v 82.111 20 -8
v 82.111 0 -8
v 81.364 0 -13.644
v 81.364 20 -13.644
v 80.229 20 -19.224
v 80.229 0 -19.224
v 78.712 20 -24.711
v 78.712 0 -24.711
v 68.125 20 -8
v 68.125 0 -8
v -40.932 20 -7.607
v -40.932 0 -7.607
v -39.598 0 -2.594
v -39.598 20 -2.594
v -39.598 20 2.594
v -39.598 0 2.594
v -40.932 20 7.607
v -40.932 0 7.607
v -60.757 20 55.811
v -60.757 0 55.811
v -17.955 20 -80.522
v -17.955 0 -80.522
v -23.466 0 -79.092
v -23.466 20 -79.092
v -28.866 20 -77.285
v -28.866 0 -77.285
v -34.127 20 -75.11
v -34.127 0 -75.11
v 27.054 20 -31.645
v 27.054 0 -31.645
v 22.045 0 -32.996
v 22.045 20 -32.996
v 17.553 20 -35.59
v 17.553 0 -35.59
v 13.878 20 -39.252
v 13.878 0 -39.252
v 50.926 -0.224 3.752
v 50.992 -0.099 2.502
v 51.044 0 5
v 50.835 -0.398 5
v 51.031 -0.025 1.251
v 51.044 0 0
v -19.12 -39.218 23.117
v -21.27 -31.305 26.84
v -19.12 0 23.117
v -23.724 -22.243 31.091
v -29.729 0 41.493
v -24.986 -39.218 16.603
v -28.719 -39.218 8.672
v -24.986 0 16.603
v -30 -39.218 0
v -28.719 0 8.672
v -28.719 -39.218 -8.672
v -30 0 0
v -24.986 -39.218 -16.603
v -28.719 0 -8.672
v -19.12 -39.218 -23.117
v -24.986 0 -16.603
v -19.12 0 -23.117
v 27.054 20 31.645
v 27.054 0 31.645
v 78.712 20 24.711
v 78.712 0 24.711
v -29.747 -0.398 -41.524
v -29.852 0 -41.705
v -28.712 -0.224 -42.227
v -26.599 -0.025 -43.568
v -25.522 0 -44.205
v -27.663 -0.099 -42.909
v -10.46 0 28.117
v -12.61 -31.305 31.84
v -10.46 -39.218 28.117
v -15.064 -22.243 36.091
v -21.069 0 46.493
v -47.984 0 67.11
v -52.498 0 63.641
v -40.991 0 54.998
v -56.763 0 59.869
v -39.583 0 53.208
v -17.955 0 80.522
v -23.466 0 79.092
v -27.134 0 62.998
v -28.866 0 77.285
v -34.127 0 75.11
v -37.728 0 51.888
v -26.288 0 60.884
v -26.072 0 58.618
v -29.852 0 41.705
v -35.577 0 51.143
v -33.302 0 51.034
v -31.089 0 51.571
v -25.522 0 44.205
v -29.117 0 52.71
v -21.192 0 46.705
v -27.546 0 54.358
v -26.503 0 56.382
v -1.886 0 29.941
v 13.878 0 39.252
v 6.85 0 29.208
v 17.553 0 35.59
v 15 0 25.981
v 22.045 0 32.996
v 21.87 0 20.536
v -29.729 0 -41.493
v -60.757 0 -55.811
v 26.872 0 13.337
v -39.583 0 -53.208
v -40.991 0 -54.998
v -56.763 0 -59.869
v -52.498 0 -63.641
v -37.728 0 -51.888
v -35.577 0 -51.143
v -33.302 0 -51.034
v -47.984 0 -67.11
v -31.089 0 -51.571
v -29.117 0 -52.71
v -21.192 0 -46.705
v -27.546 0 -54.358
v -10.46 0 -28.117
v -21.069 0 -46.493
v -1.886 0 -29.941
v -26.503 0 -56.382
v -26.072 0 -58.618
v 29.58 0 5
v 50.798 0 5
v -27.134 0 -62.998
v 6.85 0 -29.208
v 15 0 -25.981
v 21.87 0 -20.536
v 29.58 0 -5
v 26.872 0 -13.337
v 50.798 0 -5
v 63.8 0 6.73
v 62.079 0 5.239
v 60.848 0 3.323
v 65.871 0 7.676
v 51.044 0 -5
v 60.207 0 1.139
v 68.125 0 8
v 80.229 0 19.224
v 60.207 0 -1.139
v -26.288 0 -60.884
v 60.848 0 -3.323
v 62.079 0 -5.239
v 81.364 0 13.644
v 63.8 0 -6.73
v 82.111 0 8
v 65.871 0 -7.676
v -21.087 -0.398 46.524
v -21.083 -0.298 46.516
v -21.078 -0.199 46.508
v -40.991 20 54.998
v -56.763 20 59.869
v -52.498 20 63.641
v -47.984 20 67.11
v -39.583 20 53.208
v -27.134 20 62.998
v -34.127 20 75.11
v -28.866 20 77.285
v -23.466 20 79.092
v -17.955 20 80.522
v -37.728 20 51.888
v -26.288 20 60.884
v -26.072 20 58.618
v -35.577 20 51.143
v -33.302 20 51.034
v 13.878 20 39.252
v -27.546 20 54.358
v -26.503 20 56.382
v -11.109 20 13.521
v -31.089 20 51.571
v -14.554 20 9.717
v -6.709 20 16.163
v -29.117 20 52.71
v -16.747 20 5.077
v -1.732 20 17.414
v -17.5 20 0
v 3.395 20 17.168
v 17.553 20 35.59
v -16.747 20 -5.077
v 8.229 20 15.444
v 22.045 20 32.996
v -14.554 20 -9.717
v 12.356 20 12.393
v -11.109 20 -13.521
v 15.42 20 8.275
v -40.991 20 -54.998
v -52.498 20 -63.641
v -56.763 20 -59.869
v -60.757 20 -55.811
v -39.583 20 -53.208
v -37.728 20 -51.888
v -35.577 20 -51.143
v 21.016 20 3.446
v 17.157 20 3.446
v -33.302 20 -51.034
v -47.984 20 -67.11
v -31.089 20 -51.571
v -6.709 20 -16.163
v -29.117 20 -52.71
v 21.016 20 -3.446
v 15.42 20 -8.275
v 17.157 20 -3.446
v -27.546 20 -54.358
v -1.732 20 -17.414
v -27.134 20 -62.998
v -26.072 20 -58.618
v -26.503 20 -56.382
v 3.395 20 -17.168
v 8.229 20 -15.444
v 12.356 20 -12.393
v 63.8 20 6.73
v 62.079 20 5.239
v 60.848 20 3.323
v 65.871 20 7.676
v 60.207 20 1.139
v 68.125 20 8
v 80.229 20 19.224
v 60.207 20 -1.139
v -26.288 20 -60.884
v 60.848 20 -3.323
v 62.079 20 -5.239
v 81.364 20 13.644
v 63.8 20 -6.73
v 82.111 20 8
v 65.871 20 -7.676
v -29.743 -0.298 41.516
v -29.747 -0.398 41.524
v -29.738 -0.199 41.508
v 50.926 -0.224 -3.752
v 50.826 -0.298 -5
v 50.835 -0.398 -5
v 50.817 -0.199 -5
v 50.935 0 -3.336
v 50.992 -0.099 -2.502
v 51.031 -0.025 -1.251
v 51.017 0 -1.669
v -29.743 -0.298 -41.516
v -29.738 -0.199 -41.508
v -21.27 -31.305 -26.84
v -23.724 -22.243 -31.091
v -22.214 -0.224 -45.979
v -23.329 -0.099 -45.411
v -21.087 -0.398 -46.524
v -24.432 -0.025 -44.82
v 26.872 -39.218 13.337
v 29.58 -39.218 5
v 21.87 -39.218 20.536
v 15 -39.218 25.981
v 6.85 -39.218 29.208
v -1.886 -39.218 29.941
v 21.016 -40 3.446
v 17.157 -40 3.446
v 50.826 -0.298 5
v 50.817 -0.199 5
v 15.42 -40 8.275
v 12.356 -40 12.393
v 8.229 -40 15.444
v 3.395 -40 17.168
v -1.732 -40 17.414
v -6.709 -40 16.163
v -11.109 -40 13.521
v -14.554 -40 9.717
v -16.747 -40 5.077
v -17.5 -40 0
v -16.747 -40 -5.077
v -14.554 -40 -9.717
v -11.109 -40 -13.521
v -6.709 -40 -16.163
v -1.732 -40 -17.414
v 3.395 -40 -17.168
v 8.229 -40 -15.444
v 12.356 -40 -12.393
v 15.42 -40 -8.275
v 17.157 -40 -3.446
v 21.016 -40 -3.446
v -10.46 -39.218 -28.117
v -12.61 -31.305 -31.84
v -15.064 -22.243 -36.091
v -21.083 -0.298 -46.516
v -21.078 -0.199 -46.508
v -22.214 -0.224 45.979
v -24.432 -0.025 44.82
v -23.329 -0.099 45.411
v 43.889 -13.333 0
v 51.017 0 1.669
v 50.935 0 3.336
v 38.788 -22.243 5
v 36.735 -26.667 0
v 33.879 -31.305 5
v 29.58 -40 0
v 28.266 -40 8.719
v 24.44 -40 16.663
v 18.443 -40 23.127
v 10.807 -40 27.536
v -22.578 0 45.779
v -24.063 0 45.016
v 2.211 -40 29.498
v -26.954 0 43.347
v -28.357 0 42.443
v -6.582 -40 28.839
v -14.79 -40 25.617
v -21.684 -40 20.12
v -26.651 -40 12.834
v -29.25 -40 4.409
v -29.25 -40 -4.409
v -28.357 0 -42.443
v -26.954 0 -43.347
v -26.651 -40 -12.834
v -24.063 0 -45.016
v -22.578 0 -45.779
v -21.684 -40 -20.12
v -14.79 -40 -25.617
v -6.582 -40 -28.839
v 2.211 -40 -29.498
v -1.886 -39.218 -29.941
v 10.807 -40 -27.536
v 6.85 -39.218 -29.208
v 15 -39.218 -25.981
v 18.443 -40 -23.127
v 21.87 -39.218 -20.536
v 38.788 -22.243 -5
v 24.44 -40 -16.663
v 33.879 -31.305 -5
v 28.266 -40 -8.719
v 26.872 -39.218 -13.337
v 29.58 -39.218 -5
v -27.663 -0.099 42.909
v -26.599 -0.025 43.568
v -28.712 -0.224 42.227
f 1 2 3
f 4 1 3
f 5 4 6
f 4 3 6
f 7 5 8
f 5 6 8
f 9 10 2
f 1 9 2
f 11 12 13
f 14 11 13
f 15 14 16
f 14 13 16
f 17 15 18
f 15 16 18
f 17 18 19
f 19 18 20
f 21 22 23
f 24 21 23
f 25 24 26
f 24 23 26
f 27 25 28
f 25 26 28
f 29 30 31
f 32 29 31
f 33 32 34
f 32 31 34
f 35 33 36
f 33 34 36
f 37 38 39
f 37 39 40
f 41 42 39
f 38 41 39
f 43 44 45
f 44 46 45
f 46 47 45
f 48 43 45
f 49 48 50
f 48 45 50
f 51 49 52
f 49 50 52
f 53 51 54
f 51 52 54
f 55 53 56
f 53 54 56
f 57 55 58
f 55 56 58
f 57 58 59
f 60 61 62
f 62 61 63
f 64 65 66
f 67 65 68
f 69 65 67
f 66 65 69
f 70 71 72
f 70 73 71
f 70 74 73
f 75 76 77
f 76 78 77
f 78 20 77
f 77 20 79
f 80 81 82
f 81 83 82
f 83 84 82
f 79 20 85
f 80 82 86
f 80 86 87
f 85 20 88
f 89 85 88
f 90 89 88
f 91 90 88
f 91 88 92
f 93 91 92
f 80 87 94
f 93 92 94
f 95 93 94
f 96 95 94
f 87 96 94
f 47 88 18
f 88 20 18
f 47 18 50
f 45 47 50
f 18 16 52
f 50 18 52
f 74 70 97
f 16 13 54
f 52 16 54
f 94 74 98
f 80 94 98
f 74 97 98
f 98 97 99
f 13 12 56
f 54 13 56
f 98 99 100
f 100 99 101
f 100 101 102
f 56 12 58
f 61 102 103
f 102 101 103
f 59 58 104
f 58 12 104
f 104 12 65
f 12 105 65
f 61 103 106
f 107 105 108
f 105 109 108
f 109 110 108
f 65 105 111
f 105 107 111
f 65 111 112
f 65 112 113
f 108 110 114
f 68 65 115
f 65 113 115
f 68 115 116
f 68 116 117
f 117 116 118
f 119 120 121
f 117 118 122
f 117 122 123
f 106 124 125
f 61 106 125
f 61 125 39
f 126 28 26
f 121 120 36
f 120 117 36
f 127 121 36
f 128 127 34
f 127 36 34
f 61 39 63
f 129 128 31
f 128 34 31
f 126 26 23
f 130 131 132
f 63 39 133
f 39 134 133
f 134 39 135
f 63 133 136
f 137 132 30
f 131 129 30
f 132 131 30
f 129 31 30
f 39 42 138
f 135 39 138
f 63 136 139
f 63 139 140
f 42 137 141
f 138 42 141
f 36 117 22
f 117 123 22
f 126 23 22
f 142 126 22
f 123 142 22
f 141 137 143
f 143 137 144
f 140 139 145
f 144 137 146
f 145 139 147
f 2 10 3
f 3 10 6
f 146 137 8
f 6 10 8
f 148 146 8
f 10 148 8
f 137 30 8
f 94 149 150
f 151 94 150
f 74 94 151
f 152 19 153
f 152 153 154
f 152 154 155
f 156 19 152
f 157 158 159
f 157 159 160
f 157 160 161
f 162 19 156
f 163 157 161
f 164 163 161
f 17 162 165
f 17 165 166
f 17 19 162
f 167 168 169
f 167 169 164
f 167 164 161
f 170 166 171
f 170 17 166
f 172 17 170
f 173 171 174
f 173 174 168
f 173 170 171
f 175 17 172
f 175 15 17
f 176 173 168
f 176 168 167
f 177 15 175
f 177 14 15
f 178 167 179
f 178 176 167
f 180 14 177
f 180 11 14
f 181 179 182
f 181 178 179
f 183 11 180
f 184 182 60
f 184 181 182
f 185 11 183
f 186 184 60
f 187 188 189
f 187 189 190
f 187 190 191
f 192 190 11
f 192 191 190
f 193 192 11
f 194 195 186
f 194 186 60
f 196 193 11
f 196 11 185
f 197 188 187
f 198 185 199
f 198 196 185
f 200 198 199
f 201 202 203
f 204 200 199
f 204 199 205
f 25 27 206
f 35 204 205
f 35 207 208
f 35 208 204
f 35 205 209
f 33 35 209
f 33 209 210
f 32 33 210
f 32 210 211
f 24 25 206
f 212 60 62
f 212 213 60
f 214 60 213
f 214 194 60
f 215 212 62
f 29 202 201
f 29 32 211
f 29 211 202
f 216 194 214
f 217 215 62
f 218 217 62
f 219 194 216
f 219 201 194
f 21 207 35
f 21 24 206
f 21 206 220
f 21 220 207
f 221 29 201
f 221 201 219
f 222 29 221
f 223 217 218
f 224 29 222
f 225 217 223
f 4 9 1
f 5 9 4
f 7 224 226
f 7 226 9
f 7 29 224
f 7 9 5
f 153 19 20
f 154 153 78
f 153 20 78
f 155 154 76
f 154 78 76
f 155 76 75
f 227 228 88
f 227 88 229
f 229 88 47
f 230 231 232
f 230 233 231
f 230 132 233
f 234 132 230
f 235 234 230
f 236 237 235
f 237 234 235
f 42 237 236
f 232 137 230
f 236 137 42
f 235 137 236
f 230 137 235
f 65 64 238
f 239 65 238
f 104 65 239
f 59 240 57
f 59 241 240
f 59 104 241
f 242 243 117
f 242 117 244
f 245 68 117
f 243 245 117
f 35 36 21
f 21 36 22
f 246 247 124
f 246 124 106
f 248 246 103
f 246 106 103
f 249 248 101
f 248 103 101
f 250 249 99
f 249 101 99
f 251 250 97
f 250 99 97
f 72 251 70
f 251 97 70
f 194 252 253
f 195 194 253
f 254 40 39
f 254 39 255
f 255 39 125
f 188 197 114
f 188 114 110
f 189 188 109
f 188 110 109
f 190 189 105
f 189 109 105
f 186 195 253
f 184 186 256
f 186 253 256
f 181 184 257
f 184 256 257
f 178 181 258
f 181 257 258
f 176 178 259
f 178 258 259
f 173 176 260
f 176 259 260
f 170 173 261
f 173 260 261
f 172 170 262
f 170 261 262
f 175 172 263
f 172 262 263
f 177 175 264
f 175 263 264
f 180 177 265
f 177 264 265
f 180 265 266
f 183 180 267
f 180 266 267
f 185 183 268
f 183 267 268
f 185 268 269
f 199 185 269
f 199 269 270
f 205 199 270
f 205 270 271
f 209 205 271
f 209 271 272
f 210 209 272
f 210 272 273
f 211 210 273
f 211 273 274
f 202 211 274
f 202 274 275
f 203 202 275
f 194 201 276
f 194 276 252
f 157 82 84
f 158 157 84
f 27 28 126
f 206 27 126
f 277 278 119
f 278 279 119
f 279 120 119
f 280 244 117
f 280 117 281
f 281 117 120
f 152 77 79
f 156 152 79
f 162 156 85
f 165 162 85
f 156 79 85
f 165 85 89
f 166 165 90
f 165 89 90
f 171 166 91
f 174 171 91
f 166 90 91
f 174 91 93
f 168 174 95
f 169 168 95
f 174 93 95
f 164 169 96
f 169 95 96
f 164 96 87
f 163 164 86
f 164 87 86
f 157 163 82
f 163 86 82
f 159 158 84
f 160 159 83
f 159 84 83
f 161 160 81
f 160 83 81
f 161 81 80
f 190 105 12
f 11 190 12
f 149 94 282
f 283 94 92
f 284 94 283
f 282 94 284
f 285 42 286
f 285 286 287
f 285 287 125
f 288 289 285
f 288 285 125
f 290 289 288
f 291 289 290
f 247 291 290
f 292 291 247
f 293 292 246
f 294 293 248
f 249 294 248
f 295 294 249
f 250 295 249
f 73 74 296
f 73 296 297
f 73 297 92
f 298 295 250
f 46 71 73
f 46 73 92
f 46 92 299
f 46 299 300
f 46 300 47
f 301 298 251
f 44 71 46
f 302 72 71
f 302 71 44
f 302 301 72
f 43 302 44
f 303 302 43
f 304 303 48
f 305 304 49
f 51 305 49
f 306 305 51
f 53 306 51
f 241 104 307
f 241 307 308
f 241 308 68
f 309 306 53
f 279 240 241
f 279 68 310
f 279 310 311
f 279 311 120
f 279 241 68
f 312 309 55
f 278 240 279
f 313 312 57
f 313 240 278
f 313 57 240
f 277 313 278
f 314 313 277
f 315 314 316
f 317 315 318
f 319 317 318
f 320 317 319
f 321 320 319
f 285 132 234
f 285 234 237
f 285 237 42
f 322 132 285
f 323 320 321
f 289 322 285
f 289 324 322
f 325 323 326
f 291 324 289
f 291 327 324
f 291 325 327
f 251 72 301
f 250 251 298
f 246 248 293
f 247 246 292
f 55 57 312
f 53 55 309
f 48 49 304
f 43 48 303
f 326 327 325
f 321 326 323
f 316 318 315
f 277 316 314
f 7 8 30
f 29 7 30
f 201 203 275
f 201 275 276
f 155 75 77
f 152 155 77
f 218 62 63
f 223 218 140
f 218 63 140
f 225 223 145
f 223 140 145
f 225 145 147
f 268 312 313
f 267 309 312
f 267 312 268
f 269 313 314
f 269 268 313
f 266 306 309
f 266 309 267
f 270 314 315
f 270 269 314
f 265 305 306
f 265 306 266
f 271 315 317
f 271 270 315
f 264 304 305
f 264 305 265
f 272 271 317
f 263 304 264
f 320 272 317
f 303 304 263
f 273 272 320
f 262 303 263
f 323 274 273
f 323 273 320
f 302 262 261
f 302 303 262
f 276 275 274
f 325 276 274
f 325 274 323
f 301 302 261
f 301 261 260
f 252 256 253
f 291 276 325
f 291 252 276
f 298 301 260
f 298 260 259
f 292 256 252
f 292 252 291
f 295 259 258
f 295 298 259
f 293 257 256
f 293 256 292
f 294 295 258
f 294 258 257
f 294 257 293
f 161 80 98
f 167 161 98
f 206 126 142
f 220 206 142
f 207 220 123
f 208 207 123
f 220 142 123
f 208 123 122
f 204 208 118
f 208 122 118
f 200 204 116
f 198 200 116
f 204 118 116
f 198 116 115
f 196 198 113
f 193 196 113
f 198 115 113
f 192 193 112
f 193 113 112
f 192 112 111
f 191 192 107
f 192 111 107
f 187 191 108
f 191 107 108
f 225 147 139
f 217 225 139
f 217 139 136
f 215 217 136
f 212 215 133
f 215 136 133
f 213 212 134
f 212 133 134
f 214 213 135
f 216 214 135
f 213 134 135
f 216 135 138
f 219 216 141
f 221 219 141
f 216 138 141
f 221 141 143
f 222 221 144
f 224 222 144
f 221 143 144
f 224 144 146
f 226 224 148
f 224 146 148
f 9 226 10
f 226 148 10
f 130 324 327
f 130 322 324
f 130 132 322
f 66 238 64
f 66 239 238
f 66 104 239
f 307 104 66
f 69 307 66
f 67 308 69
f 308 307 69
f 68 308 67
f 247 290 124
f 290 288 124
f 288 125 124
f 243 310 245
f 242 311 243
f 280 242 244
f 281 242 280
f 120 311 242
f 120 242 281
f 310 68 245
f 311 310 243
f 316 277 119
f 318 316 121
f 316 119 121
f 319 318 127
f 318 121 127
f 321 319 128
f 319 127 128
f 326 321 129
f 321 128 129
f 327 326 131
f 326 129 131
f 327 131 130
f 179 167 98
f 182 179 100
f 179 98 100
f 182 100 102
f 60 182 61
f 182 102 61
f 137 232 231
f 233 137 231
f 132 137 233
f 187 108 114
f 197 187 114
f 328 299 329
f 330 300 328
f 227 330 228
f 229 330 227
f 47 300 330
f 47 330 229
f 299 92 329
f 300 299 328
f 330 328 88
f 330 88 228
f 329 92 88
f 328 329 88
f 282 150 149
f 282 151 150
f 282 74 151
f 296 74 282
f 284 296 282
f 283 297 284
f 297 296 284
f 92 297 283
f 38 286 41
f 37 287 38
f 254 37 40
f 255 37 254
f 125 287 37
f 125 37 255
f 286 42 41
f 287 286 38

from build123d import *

# Parameters (mm, degrees)
SKETCH1_R                = 82.5
BOSS_EXTRUDE1_DEPTH      = 20
SKETCH2_R                = 30
BOSS_EXTRUDE2_DEPTH      = 40
SKETCH3_R                = 17.5
CUT_EXTRUDE1_DEPTH       = 61
BOSS_EXTRUDE3_DEPTH      = 5
CIRPATTERN4_COUNT        = 3
CUT_EXTRUDE13_DEPTH      = 21
CIRPATTERN5_COUNT        = 3
CUT_EXTRUDE14_DEPTH      = 21
CIRPATTERN6_COUNT        = 3
CUT_EXTRUDE15_DEPTH      = 21
CUT_EXTRUDE15_DEPTH_BACK = 41


with BuildPart() as part:
    # Sketch1 → Boss-Extrude1 (new body)
    with BuildSketch(Plane(origin=(0, 0, 0), x_dir=(1, 0, 0), z_dir=(0, 1, 0))):
        Circle(SKETCH1_R)
    extrude(amount=BOSS_EXTRUDE1_DEPTH)

    # Sketch2 → Boss-Extrude2 (add)
    with BuildSketch(Plane.XZ):
        Circle(SKETCH2_R)
    extrude(amount=BOSS_EXTRUDE2_DEPTH)

    # Sketch3 → Cut-Extrude1 (cut, through all)
    with BuildSketch(Plane.XZ.offset(40)):
        Circle(SKETCH3_R)
    extrude(amount=-CUT_EXTRUDE1_DEPTH, mode=Mode.SUBTRACT)

    # Sketch4 → Boss-Extrude3 (add, symmetric)
    with BuildSketch(Plane.XY):
        Polygon((26.043936365, 0), (51.043936365, 0), (30, -40), (26.043936365, -40), align=None)
    boss_extrude3 = extrude(amount=BOSS_EXTRUDE3_DEPTH, both=True)

    # CirPattern4: Boss-Extrude3 ×3 about axis
    cirpattern4_axis = Axis((0, 0, 0), (0, 1, 0))
    for i in range(1, CIRPATTERN4_COUNT):
        add(boss_extrude3.rotate(cirpattern4_axis, i * 360 / CIRPATTERN4_COUNT))

    # Sketch5 → Cut-Revolve1 (revolve, cut)
    with BuildSketch(Plane.XY):
        Polygon((51.043936365, 0), (29.580398915, -40), (54.67204938, -40), align=None)
    revolve(axis=Axis((0, 0, 0), (0, -1, 0)), mode=Mode.SUBTRACT)

    # Sketch10 → Cut-Extrude13 (cut, through all)
    with BuildSketch(Plane(origin=(0, 0, 0), x_dir=(1, 0, 0), z_dir=(0, 1, 0))):
        with BuildLine():
            ThreePointArc((-60.756737715, -55.811009866), (-82.5, 0), (-60.756737715, 55.811009866))
            Line((-60.756737715, 55.811009866), (-40.932429831, 7.606987591))
            ThreePointArc((-40.932429831, 7.606987591), (-39.429287397, 0), (-40.932429831, -7.606987591))
            Line((-40.932429831, -7.606987591), (-60.756737715, -55.811009866))
        make_face()
    cut_extrude13 = extrude(amount=CUT_EXTRUDE13_DEPTH, mode=Mode.SUBTRACT)

    # CirPattern5: Cut-Extrude13 ×3 about axis
    cirpattern5_axis = Axis((0, 0, 0), (0, 1, 0))
    for i in range(1, CIRPATTERN5_COUNT):
        add(cut_extrude13.rotate(cirpattern5_axis, i * 360 / CIRPATTERN5_COUNT), mode=Mode.SUBTRACT)

    # Sketch11 → Cut-Extrude14 (cut, through all)
    with BuildSketch(Plane(origin=(0, 0, 0), x_dir=(1, 0, 0), z_dir=(0, 1, 0))):
        with BuildLine():
            Line((68.125333986, 8), (82.111205082, 8))
            ThreePointArc((82.111205082, 8), (82.5, 0), (82.111205082, -8))
            Line((82.111205082, -8), (68.125333986, -8))
            ThreePointArc((68.125333986, -8), (60.125333986, 0), (68.125333986, 8))
        make_face()
    cut_extrude14 = extrude(amount=CUT_EXTRUDE14_DEPTH, mode=Mode.SUBTRACT)

    # CirPattern6: Cut-Extrude14 ×3 about axis
    cirpattern6_axis = Axis((0, 0, 0), (0, 1, 0))
    for i in range(1, CIRPATTERN6_COUNT):
        add(cut_extrude14.rotate(cirpattern6_axis, i * 360 / CIRPATTERN6_COUNT), mode=Mode.SUBTRACT)

    # Sketch13 → Cut-Extrude15 (cut, two sides)
    with BuildSketch(Plane(origin=(0, 0, 0), x_dir=(1, 0, 0), z_dir=(0, 1, 0))) as cut_extrude15_sk:
        with BuildLine():
            Line((17.15731582, 3.446231834), (21.015929185, 3.446231834))
            Line((21.015929185, 3.446231834), (21.015929185, -3.446231834))
            Line((21.015929185, -3.446231834), (17.15731582, -3.446231834))
            ThreePointArc((17.15731582, -3.446231834), (17.5, 0), (17.15731582, 3.446231834))
        make_face()
    extrude(amount=CUT_EXTRUDE15_DEPTH, mode=Mode.SUBTRACT)
    extrude(cut_extrude15_sk.sketch, amount=-CUT_EXTRUDE15_DEPTH_BACK, mode=Mode.SUBTRACT)


solid = part.part
